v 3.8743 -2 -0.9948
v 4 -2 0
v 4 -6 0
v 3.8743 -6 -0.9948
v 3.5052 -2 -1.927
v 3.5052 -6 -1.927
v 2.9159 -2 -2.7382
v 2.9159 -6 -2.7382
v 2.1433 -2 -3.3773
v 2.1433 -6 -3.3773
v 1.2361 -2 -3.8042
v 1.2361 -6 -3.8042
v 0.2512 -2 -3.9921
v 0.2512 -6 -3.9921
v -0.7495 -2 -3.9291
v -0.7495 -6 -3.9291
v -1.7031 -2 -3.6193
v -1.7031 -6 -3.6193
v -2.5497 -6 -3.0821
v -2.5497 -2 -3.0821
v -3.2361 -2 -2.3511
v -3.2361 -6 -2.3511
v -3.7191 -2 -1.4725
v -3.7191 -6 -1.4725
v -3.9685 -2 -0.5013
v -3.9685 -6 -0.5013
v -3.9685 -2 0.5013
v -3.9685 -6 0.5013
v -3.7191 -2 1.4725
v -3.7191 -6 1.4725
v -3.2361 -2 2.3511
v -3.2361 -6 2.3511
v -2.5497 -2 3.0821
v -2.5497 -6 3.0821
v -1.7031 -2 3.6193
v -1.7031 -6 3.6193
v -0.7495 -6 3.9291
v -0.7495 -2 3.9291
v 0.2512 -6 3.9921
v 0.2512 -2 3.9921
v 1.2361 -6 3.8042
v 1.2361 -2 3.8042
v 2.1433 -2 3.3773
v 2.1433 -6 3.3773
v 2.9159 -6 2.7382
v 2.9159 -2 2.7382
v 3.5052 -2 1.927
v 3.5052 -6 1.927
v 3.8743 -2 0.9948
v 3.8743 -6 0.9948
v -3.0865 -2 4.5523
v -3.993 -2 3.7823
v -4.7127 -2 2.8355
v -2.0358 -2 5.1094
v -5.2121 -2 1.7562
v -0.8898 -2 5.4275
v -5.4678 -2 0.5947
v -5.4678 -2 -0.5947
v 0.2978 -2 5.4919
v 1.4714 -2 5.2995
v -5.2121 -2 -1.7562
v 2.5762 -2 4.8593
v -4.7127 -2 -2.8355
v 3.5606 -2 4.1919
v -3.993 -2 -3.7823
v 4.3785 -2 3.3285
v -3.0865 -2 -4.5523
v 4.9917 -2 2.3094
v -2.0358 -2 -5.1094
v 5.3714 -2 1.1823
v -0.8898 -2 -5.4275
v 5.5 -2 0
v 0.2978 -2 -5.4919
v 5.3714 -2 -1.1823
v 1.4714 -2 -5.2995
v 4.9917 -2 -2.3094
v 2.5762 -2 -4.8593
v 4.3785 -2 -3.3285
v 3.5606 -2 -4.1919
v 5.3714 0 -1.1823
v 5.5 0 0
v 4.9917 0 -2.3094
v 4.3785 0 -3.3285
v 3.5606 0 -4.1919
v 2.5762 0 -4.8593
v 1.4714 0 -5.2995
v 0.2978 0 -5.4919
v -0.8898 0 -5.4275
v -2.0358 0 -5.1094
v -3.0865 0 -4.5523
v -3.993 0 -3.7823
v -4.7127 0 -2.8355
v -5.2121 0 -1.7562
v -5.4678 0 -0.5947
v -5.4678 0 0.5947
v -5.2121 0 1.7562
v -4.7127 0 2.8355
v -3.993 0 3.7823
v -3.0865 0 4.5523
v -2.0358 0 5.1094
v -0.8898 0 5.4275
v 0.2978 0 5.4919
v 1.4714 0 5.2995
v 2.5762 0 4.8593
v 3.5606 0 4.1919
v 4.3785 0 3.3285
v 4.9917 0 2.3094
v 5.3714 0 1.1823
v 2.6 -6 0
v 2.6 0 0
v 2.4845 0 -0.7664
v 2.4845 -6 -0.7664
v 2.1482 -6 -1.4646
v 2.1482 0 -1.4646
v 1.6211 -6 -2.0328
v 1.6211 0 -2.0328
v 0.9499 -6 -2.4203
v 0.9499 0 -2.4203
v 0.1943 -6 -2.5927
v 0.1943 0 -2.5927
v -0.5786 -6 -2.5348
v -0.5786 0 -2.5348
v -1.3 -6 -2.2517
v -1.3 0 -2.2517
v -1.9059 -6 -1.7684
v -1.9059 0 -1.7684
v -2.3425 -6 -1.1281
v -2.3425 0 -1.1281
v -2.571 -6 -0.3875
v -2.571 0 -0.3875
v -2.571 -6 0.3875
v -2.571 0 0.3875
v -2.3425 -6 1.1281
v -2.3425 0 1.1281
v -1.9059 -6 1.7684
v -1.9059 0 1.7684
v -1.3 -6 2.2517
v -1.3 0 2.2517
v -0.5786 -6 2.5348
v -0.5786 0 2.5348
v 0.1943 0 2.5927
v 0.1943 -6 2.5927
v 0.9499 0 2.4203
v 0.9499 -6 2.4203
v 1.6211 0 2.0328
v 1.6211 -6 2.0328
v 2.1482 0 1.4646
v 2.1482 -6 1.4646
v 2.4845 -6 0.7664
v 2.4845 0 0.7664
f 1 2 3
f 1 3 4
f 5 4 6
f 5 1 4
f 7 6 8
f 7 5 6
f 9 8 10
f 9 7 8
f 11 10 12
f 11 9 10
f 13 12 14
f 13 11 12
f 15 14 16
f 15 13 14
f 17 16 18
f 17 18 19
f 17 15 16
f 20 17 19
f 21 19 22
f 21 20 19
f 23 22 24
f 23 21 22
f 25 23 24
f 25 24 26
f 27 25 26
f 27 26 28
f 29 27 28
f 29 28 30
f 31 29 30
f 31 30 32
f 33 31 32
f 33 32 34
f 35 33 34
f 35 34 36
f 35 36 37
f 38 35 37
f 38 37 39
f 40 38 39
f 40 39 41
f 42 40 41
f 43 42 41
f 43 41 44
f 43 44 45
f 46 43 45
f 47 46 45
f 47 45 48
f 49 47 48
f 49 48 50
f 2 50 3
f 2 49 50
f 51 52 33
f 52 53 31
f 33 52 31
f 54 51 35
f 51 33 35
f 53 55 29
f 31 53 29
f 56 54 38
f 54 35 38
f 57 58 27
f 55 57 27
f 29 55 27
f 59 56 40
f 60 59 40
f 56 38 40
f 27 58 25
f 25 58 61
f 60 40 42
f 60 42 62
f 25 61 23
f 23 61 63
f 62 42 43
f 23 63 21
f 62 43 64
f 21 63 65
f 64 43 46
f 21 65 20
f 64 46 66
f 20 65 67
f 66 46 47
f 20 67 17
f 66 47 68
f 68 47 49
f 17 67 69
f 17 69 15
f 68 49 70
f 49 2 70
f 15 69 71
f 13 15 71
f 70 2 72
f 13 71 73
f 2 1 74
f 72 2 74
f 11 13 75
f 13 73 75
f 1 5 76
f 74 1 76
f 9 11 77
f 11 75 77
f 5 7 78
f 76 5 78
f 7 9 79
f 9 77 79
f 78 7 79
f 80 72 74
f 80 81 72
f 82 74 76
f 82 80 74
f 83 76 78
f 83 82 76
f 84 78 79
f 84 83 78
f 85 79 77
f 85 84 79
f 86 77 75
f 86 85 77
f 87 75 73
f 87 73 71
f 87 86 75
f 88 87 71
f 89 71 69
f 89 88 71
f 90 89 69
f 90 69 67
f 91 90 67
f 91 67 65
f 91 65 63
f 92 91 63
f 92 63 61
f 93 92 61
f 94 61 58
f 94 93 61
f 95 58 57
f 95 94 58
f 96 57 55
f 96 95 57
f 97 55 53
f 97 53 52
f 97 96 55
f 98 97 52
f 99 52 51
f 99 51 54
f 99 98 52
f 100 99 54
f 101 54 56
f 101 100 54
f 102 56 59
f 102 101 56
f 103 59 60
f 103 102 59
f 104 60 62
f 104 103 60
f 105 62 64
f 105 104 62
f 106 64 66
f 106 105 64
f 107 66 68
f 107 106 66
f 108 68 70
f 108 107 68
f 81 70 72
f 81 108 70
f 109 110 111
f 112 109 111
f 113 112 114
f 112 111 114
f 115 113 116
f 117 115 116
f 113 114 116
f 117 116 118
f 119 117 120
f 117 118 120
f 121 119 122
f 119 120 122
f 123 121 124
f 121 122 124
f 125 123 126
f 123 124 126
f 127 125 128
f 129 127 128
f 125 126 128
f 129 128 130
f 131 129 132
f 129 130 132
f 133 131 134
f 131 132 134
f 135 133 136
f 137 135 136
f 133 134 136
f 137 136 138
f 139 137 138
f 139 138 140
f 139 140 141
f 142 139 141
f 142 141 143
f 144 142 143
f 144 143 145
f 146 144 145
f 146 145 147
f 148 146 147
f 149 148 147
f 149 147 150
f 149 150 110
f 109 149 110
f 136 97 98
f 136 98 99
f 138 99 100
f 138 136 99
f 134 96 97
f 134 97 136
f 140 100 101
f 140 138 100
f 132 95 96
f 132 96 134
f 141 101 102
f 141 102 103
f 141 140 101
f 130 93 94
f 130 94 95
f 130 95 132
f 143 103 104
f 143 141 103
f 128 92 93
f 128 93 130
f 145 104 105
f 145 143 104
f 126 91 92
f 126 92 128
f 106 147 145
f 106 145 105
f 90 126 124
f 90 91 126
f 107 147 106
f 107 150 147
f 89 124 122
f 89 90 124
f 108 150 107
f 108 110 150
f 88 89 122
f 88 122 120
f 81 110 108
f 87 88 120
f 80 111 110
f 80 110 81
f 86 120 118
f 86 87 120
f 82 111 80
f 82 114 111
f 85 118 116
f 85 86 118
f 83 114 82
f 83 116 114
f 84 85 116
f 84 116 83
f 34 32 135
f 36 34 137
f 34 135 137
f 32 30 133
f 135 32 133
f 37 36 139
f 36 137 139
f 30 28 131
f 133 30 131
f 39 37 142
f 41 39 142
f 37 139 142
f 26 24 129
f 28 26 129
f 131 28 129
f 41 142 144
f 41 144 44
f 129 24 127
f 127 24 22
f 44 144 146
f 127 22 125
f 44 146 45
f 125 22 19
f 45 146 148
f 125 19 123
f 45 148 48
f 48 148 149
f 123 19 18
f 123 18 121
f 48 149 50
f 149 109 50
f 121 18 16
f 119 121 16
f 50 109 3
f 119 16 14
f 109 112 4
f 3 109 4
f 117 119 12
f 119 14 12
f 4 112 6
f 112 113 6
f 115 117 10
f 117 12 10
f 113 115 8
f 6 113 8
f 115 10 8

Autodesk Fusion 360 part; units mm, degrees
sketch "Sketch1" plane through (0, 0, 0) normal (0, 1, 0) x (1, 0, 0)
  circle A0 centre (0, 0) radius 4
  circle A1 centre (0, 0) radius 2.6
  dimension "d1" = 8
  dimension "d2" = 5.2
extrude "Extrude1" add sketch "Sketch1" against normal blind 6 makes body 1
sketch "Sketch2" plane through (0, 0, 0) normal (0, 1, 0) x (1, 0, 0)
  circle A0 centre (0, 0) radius 5.5
  circle A1 centre (0, 0) radius 4
  dimension "d5" = 11
  dimension "d6" = 8
extrude "Extrude2" add sketch "Sketch2" against normal blind 2 bodies 1
copy_body "Body->Comp1" bodies 1 removing the originals makes body 2 in component "Component"
component "Component" placed x (1, 0, 0) y (0, 1, 0) z (0, 0, 1) at (0, 0, 0)
equation "d2 = 8 mm - 2.8 mm"
